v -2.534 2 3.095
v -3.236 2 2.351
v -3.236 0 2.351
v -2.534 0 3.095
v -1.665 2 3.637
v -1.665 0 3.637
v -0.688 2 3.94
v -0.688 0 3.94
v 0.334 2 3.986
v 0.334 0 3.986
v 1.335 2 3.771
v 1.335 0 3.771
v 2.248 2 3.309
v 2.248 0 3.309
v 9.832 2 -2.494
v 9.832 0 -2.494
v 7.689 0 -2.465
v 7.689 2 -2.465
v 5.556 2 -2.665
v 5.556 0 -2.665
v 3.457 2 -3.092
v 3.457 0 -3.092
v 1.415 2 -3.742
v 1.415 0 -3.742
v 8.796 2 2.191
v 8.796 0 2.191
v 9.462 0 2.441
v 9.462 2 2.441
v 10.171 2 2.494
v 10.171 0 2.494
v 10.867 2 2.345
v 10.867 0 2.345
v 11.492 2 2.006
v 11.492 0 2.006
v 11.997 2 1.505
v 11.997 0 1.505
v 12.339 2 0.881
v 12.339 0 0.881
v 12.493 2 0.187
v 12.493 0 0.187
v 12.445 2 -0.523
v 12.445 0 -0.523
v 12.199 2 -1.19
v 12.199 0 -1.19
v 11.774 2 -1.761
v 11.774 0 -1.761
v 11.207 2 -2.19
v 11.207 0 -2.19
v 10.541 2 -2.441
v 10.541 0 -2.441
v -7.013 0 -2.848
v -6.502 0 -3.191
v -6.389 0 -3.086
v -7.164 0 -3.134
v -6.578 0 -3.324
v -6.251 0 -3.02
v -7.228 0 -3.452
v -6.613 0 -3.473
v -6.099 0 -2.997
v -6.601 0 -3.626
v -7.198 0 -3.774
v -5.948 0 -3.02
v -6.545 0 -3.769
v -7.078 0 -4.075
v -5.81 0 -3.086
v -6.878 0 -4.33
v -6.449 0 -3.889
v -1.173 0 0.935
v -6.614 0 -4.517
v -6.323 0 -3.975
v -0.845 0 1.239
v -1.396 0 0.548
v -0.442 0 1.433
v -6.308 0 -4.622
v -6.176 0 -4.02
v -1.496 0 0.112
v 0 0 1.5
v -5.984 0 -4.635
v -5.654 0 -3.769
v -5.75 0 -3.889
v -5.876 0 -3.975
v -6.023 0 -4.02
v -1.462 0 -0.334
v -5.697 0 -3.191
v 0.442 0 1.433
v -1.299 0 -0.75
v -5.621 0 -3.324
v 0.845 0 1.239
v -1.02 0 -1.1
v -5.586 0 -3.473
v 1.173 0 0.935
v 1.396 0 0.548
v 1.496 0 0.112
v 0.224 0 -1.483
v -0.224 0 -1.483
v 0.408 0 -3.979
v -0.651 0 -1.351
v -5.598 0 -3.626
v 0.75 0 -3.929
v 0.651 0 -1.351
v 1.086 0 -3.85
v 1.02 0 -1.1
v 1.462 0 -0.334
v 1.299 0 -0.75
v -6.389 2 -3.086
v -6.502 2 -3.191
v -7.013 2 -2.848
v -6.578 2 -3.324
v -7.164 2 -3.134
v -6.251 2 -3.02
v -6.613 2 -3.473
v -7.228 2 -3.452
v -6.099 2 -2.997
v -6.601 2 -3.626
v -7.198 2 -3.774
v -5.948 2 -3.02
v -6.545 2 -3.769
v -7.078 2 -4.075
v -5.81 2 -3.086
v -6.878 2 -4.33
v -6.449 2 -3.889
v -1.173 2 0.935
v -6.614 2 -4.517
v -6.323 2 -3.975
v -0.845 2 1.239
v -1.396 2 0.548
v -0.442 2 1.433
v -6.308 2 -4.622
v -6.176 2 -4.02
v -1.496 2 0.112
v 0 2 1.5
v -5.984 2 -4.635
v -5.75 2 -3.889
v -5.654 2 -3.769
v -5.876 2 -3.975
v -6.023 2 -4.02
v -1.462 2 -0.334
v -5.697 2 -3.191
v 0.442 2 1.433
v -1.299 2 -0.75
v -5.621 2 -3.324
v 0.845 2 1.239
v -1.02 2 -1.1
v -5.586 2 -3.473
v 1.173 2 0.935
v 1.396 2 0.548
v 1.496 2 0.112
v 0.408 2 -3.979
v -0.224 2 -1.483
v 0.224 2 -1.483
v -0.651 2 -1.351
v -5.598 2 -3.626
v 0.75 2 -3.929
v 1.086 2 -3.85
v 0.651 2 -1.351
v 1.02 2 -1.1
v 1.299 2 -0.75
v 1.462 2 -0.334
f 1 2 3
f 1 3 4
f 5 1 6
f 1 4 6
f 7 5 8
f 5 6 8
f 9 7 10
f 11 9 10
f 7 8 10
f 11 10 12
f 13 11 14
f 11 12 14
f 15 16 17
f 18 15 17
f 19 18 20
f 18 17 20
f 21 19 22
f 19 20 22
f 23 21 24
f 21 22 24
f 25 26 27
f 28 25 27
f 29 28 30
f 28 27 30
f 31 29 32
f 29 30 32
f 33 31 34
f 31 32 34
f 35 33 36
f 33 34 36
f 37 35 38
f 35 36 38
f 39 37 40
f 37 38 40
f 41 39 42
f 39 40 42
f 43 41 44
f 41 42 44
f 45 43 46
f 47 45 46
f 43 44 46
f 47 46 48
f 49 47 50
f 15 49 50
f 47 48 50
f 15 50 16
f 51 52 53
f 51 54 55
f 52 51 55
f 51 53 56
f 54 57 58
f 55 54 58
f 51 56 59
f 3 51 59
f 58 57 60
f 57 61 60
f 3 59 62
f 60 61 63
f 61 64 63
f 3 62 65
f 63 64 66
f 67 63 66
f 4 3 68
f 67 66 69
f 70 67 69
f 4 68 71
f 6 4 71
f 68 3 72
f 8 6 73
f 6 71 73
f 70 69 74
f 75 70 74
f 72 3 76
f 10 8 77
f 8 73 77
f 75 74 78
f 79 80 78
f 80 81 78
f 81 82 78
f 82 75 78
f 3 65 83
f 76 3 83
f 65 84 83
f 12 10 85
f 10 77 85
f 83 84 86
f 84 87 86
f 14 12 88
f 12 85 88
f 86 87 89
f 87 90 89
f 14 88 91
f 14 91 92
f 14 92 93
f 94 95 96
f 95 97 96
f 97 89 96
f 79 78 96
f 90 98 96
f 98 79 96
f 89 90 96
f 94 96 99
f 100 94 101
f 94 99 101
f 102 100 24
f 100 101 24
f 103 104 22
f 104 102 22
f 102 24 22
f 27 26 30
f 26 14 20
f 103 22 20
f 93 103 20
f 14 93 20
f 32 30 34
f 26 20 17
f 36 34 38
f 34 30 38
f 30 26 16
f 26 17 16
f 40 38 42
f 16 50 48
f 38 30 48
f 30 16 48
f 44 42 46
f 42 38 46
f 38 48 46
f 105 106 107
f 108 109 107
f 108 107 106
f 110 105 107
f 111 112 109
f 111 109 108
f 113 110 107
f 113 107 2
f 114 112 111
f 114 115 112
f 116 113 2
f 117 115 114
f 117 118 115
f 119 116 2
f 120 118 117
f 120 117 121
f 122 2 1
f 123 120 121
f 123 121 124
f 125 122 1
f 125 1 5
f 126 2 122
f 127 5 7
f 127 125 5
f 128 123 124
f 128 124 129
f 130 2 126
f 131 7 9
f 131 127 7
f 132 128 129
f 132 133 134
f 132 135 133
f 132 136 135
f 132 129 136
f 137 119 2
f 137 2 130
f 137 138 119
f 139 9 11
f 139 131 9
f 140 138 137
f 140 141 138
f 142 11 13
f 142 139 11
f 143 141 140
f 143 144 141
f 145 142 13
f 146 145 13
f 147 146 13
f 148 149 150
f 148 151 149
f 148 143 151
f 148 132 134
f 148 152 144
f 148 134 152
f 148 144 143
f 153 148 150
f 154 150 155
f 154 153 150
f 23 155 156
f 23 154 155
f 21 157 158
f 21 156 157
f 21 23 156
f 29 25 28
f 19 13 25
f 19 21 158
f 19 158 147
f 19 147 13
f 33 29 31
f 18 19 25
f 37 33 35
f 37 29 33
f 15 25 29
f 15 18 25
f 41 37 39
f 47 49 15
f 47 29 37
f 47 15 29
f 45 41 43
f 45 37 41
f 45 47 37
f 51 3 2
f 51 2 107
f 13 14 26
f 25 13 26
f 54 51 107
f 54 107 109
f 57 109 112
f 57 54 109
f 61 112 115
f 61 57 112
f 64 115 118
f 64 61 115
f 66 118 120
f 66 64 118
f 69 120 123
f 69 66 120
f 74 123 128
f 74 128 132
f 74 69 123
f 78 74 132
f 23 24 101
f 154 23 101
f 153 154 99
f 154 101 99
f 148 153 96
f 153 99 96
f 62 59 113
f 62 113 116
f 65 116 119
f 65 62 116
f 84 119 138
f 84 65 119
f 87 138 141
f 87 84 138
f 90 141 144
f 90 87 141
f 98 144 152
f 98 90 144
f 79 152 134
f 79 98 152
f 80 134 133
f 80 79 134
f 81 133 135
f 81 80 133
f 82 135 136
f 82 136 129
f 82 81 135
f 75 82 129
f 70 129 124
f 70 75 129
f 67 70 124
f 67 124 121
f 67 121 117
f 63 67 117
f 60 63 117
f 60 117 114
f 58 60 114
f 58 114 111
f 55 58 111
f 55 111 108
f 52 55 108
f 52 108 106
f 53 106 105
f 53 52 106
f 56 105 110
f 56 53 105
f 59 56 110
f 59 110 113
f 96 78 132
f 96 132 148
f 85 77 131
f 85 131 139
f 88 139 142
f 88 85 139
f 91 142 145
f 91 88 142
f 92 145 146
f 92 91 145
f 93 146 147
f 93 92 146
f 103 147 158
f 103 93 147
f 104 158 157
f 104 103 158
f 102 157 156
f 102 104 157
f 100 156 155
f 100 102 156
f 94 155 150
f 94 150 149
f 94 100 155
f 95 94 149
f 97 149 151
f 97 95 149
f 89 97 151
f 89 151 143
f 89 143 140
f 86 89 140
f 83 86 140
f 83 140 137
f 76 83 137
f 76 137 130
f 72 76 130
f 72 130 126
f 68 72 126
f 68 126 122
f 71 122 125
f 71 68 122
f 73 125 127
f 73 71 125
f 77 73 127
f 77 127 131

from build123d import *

# Parameters (mm, degrees)
SKETCH1_R           = 1.5
BOSS_EXTRUDE1_DEPTH = 2
BOSS_EXTRUDE2_START = -2
SKETCH2_R           = 0.514521653
BOSS_EXTRUDE2_DEPTH = 2


with BuildPart() as part:
    # Sketch1 → Boss-Extrude1 (new body)
    with BuildSketch(Plane(origin=(0, 0, 0), x_dir=(1, 0, 0), z_dir=(0, 1, 0))):
        with BuildLine():
            Line((2.247922133, -3.308601832), (8.796170176, -2.191071372))
            ThreePointArc((8.796170176, -2.191071372), (12.441065174, -0.53963026), (9.831944444, 2.49434507))
            ThreePointArc((9.831944444, 2.49434507), (5.556167823, 2.665089568), (1.414583333, 3.741517606))
            ThreePointArc((1.414583333, 3.741517606), (-3.972345981, -0.469539568), (2.247922133, -3.308601832))
        make_face()
        with Locations(Location((0, 0, 0), (0, 0, 270))):
            Circle(SKETCH1_R, mode=Mode.SUBTRACT)
    extrude(amount=BOSS_EXTRUDE1_DEPTH)

    # Sketch2 → Boss-Extrude2 (add)
    with BuildSketch(Plane(origin=(0, 2, 0), x_dir=(1, 0, 0), z_dir=(0, 1, 0)).offset(BOSS_EXTRUDE2_START)):
        with BuildLine():
            Line((-5.984144072, 4.635311674), (0.408466301, 3.979089755))
            ThreePointArc((0.408466301, 3.979089755), (-3.466544022, 1.995763648), (-3.236020649, -2.35120615))
            Line((-3.236020649, -2.35120615), (-7.013353091, 2.847625854))
            ThreePointArc((-7.013353091, 2.847625854), (-7.078453265, 4.075217168), (-5.984144072, 4.635311674))
        make_face()
        with Locations(Location((-6.099495617, 3.51161028, 0), (0, 0, 270))):
            Circle(SKETCH2_R, mode=Mode.SUBTRACT)
    extrude(amount=BOSS_EXTRUDE2_DEPTH)


solid = part.part
